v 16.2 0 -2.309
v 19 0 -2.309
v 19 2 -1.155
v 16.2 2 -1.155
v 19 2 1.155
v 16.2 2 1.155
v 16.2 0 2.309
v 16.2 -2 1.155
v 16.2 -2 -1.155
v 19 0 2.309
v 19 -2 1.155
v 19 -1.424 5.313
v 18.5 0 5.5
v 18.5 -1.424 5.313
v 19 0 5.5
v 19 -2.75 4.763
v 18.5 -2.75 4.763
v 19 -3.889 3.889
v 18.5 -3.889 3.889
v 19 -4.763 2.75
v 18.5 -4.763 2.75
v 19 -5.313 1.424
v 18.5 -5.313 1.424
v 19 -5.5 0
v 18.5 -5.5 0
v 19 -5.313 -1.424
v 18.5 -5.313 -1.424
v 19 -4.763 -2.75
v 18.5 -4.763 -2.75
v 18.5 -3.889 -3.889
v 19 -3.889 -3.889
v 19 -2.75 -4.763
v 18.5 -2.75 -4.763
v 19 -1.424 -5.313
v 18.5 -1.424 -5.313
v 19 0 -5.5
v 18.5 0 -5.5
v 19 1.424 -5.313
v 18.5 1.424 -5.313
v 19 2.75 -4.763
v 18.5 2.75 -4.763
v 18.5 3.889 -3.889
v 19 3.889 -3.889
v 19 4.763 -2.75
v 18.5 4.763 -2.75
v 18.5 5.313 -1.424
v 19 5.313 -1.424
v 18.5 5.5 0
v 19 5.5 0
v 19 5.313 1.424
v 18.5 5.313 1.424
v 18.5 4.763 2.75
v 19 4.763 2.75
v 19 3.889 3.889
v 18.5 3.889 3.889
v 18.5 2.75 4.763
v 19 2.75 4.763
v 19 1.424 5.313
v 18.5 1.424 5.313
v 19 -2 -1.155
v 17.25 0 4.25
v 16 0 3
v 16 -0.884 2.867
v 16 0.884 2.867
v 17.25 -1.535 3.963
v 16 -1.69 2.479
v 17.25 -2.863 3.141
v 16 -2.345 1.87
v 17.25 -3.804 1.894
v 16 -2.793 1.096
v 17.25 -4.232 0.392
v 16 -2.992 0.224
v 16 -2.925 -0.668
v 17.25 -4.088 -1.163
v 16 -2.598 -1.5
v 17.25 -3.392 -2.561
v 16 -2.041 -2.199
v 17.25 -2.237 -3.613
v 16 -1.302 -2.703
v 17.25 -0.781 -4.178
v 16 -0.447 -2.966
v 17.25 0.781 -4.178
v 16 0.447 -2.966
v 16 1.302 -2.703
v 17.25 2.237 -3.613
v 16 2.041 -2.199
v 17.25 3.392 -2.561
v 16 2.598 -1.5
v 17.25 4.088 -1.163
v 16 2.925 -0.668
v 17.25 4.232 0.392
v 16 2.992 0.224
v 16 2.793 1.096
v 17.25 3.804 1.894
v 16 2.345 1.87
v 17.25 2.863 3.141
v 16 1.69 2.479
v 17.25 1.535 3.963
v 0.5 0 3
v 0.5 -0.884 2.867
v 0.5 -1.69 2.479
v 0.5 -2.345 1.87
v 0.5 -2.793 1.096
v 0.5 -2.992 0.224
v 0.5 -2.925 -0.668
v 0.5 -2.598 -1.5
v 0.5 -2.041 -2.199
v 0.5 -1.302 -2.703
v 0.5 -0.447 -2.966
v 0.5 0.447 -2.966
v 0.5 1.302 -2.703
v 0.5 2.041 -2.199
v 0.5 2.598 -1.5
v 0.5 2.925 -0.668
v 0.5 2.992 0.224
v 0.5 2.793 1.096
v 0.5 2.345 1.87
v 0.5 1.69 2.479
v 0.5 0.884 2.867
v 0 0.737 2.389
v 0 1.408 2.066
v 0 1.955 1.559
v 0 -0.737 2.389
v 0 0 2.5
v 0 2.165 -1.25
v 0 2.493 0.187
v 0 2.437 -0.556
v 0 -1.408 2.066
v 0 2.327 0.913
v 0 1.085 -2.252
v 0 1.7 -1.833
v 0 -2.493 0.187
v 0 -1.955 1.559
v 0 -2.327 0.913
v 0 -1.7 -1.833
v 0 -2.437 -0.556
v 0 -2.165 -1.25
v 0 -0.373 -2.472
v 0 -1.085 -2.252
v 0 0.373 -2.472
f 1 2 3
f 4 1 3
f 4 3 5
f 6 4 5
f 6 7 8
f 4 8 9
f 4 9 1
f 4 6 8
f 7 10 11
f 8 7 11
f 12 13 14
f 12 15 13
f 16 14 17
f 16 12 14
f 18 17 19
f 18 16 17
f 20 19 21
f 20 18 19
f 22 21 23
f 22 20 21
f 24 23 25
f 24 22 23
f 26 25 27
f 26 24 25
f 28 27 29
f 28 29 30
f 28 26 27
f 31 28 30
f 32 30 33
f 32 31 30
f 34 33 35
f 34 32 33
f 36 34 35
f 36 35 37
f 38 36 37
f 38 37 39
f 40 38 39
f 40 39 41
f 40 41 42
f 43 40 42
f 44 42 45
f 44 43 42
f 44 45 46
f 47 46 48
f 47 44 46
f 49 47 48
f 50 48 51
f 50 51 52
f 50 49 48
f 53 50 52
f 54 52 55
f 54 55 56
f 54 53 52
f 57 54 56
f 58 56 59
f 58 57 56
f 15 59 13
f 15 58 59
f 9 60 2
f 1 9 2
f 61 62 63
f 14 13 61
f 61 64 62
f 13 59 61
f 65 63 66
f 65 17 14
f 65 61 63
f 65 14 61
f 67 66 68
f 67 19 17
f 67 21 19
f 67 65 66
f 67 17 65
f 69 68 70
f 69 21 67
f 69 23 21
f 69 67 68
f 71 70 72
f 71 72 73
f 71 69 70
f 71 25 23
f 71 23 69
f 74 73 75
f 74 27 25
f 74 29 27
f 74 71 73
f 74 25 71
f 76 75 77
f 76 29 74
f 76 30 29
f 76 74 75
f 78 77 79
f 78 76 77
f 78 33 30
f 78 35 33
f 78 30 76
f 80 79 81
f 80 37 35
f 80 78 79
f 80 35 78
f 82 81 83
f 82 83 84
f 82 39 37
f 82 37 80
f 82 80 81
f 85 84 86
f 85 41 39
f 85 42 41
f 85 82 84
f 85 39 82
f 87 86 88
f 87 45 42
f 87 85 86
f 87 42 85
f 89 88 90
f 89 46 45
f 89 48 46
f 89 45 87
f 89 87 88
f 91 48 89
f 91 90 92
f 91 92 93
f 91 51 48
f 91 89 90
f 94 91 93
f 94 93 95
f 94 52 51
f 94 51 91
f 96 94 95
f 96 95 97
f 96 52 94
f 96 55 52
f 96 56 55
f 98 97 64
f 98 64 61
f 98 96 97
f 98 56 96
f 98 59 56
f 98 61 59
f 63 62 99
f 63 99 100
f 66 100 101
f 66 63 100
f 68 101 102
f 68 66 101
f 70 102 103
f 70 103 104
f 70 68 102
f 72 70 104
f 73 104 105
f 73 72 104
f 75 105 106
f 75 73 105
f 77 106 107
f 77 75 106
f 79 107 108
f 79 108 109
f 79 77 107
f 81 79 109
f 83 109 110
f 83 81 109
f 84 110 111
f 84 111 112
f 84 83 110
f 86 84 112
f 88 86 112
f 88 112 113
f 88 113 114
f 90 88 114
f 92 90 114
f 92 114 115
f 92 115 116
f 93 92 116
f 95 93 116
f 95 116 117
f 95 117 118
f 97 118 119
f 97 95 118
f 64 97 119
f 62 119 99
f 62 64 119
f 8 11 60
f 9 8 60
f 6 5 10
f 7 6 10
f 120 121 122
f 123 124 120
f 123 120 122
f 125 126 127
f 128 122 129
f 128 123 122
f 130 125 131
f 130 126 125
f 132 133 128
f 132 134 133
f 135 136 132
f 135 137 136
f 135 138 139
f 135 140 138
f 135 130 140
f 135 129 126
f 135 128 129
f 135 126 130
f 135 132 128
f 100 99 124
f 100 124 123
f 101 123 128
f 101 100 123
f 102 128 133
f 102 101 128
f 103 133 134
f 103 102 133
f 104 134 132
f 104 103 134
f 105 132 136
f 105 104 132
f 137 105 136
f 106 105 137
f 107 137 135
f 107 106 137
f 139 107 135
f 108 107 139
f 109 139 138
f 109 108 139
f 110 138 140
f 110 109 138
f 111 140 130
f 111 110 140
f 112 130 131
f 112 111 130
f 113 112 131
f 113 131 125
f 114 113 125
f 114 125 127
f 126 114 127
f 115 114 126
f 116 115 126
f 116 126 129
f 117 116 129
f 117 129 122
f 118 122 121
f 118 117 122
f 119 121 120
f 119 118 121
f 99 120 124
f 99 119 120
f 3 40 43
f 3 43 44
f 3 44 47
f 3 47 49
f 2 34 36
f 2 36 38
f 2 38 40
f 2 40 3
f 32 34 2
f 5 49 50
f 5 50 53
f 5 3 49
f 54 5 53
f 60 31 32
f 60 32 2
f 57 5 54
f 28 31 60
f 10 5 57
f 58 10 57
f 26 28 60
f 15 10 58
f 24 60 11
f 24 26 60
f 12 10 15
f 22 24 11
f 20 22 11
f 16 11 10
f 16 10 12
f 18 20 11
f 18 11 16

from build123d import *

# Parameters (mm, degrees)
CHANFREIN2_SIZE         = 0.5
EMPREINTE_POUR_CL_DEPTH = 2.8


with BuildPart() as part:
    # Esquisse1 → Base-Révolution (revolve)
    with BuildSketch(Plane.XY, mode=Mode.PRIVATE) as base_r_volution_sk:
        Polygon((0, 0), (0, 3), (16, 3), (18.5, 5.5), (19, 5.5), (19, 0), align=None)
    revolve(base_r_volution_sk.sketch.rotate(Axis((-25.828475034, 0, 0), (1, 0, 0)), 90), axis=Axis((-25.828475034, 0, 0), (1, 0, 0)))

    # Chanfrein2
    chanfrein2_edges = [part.edges().sort_by_distance(p)[0] for p in [
        (0, 0, -3),
    ]]
    chamfer(chanfrein2_edges, length=CHANFREIN2_SIZE)

    # Esquisse2 → Empreinte pour clé (cut)
    with BuildSketch(Plane(origin=(19, 0, 0), x_dir=(0, 0, -1), z_dir=(1, 0, 0))):
        Polygon((2.309401077, 0), (1.154700538, 2), (-1.154700538, 2), (-2.309401077, 0), (-1.154700538, -2), (1.154700538, -2), align=None)
    extrude(amount=-EMPREINTE_POUR_CL_DEPTH, mode=Mode.SUBTRACT)


solid = part.part
